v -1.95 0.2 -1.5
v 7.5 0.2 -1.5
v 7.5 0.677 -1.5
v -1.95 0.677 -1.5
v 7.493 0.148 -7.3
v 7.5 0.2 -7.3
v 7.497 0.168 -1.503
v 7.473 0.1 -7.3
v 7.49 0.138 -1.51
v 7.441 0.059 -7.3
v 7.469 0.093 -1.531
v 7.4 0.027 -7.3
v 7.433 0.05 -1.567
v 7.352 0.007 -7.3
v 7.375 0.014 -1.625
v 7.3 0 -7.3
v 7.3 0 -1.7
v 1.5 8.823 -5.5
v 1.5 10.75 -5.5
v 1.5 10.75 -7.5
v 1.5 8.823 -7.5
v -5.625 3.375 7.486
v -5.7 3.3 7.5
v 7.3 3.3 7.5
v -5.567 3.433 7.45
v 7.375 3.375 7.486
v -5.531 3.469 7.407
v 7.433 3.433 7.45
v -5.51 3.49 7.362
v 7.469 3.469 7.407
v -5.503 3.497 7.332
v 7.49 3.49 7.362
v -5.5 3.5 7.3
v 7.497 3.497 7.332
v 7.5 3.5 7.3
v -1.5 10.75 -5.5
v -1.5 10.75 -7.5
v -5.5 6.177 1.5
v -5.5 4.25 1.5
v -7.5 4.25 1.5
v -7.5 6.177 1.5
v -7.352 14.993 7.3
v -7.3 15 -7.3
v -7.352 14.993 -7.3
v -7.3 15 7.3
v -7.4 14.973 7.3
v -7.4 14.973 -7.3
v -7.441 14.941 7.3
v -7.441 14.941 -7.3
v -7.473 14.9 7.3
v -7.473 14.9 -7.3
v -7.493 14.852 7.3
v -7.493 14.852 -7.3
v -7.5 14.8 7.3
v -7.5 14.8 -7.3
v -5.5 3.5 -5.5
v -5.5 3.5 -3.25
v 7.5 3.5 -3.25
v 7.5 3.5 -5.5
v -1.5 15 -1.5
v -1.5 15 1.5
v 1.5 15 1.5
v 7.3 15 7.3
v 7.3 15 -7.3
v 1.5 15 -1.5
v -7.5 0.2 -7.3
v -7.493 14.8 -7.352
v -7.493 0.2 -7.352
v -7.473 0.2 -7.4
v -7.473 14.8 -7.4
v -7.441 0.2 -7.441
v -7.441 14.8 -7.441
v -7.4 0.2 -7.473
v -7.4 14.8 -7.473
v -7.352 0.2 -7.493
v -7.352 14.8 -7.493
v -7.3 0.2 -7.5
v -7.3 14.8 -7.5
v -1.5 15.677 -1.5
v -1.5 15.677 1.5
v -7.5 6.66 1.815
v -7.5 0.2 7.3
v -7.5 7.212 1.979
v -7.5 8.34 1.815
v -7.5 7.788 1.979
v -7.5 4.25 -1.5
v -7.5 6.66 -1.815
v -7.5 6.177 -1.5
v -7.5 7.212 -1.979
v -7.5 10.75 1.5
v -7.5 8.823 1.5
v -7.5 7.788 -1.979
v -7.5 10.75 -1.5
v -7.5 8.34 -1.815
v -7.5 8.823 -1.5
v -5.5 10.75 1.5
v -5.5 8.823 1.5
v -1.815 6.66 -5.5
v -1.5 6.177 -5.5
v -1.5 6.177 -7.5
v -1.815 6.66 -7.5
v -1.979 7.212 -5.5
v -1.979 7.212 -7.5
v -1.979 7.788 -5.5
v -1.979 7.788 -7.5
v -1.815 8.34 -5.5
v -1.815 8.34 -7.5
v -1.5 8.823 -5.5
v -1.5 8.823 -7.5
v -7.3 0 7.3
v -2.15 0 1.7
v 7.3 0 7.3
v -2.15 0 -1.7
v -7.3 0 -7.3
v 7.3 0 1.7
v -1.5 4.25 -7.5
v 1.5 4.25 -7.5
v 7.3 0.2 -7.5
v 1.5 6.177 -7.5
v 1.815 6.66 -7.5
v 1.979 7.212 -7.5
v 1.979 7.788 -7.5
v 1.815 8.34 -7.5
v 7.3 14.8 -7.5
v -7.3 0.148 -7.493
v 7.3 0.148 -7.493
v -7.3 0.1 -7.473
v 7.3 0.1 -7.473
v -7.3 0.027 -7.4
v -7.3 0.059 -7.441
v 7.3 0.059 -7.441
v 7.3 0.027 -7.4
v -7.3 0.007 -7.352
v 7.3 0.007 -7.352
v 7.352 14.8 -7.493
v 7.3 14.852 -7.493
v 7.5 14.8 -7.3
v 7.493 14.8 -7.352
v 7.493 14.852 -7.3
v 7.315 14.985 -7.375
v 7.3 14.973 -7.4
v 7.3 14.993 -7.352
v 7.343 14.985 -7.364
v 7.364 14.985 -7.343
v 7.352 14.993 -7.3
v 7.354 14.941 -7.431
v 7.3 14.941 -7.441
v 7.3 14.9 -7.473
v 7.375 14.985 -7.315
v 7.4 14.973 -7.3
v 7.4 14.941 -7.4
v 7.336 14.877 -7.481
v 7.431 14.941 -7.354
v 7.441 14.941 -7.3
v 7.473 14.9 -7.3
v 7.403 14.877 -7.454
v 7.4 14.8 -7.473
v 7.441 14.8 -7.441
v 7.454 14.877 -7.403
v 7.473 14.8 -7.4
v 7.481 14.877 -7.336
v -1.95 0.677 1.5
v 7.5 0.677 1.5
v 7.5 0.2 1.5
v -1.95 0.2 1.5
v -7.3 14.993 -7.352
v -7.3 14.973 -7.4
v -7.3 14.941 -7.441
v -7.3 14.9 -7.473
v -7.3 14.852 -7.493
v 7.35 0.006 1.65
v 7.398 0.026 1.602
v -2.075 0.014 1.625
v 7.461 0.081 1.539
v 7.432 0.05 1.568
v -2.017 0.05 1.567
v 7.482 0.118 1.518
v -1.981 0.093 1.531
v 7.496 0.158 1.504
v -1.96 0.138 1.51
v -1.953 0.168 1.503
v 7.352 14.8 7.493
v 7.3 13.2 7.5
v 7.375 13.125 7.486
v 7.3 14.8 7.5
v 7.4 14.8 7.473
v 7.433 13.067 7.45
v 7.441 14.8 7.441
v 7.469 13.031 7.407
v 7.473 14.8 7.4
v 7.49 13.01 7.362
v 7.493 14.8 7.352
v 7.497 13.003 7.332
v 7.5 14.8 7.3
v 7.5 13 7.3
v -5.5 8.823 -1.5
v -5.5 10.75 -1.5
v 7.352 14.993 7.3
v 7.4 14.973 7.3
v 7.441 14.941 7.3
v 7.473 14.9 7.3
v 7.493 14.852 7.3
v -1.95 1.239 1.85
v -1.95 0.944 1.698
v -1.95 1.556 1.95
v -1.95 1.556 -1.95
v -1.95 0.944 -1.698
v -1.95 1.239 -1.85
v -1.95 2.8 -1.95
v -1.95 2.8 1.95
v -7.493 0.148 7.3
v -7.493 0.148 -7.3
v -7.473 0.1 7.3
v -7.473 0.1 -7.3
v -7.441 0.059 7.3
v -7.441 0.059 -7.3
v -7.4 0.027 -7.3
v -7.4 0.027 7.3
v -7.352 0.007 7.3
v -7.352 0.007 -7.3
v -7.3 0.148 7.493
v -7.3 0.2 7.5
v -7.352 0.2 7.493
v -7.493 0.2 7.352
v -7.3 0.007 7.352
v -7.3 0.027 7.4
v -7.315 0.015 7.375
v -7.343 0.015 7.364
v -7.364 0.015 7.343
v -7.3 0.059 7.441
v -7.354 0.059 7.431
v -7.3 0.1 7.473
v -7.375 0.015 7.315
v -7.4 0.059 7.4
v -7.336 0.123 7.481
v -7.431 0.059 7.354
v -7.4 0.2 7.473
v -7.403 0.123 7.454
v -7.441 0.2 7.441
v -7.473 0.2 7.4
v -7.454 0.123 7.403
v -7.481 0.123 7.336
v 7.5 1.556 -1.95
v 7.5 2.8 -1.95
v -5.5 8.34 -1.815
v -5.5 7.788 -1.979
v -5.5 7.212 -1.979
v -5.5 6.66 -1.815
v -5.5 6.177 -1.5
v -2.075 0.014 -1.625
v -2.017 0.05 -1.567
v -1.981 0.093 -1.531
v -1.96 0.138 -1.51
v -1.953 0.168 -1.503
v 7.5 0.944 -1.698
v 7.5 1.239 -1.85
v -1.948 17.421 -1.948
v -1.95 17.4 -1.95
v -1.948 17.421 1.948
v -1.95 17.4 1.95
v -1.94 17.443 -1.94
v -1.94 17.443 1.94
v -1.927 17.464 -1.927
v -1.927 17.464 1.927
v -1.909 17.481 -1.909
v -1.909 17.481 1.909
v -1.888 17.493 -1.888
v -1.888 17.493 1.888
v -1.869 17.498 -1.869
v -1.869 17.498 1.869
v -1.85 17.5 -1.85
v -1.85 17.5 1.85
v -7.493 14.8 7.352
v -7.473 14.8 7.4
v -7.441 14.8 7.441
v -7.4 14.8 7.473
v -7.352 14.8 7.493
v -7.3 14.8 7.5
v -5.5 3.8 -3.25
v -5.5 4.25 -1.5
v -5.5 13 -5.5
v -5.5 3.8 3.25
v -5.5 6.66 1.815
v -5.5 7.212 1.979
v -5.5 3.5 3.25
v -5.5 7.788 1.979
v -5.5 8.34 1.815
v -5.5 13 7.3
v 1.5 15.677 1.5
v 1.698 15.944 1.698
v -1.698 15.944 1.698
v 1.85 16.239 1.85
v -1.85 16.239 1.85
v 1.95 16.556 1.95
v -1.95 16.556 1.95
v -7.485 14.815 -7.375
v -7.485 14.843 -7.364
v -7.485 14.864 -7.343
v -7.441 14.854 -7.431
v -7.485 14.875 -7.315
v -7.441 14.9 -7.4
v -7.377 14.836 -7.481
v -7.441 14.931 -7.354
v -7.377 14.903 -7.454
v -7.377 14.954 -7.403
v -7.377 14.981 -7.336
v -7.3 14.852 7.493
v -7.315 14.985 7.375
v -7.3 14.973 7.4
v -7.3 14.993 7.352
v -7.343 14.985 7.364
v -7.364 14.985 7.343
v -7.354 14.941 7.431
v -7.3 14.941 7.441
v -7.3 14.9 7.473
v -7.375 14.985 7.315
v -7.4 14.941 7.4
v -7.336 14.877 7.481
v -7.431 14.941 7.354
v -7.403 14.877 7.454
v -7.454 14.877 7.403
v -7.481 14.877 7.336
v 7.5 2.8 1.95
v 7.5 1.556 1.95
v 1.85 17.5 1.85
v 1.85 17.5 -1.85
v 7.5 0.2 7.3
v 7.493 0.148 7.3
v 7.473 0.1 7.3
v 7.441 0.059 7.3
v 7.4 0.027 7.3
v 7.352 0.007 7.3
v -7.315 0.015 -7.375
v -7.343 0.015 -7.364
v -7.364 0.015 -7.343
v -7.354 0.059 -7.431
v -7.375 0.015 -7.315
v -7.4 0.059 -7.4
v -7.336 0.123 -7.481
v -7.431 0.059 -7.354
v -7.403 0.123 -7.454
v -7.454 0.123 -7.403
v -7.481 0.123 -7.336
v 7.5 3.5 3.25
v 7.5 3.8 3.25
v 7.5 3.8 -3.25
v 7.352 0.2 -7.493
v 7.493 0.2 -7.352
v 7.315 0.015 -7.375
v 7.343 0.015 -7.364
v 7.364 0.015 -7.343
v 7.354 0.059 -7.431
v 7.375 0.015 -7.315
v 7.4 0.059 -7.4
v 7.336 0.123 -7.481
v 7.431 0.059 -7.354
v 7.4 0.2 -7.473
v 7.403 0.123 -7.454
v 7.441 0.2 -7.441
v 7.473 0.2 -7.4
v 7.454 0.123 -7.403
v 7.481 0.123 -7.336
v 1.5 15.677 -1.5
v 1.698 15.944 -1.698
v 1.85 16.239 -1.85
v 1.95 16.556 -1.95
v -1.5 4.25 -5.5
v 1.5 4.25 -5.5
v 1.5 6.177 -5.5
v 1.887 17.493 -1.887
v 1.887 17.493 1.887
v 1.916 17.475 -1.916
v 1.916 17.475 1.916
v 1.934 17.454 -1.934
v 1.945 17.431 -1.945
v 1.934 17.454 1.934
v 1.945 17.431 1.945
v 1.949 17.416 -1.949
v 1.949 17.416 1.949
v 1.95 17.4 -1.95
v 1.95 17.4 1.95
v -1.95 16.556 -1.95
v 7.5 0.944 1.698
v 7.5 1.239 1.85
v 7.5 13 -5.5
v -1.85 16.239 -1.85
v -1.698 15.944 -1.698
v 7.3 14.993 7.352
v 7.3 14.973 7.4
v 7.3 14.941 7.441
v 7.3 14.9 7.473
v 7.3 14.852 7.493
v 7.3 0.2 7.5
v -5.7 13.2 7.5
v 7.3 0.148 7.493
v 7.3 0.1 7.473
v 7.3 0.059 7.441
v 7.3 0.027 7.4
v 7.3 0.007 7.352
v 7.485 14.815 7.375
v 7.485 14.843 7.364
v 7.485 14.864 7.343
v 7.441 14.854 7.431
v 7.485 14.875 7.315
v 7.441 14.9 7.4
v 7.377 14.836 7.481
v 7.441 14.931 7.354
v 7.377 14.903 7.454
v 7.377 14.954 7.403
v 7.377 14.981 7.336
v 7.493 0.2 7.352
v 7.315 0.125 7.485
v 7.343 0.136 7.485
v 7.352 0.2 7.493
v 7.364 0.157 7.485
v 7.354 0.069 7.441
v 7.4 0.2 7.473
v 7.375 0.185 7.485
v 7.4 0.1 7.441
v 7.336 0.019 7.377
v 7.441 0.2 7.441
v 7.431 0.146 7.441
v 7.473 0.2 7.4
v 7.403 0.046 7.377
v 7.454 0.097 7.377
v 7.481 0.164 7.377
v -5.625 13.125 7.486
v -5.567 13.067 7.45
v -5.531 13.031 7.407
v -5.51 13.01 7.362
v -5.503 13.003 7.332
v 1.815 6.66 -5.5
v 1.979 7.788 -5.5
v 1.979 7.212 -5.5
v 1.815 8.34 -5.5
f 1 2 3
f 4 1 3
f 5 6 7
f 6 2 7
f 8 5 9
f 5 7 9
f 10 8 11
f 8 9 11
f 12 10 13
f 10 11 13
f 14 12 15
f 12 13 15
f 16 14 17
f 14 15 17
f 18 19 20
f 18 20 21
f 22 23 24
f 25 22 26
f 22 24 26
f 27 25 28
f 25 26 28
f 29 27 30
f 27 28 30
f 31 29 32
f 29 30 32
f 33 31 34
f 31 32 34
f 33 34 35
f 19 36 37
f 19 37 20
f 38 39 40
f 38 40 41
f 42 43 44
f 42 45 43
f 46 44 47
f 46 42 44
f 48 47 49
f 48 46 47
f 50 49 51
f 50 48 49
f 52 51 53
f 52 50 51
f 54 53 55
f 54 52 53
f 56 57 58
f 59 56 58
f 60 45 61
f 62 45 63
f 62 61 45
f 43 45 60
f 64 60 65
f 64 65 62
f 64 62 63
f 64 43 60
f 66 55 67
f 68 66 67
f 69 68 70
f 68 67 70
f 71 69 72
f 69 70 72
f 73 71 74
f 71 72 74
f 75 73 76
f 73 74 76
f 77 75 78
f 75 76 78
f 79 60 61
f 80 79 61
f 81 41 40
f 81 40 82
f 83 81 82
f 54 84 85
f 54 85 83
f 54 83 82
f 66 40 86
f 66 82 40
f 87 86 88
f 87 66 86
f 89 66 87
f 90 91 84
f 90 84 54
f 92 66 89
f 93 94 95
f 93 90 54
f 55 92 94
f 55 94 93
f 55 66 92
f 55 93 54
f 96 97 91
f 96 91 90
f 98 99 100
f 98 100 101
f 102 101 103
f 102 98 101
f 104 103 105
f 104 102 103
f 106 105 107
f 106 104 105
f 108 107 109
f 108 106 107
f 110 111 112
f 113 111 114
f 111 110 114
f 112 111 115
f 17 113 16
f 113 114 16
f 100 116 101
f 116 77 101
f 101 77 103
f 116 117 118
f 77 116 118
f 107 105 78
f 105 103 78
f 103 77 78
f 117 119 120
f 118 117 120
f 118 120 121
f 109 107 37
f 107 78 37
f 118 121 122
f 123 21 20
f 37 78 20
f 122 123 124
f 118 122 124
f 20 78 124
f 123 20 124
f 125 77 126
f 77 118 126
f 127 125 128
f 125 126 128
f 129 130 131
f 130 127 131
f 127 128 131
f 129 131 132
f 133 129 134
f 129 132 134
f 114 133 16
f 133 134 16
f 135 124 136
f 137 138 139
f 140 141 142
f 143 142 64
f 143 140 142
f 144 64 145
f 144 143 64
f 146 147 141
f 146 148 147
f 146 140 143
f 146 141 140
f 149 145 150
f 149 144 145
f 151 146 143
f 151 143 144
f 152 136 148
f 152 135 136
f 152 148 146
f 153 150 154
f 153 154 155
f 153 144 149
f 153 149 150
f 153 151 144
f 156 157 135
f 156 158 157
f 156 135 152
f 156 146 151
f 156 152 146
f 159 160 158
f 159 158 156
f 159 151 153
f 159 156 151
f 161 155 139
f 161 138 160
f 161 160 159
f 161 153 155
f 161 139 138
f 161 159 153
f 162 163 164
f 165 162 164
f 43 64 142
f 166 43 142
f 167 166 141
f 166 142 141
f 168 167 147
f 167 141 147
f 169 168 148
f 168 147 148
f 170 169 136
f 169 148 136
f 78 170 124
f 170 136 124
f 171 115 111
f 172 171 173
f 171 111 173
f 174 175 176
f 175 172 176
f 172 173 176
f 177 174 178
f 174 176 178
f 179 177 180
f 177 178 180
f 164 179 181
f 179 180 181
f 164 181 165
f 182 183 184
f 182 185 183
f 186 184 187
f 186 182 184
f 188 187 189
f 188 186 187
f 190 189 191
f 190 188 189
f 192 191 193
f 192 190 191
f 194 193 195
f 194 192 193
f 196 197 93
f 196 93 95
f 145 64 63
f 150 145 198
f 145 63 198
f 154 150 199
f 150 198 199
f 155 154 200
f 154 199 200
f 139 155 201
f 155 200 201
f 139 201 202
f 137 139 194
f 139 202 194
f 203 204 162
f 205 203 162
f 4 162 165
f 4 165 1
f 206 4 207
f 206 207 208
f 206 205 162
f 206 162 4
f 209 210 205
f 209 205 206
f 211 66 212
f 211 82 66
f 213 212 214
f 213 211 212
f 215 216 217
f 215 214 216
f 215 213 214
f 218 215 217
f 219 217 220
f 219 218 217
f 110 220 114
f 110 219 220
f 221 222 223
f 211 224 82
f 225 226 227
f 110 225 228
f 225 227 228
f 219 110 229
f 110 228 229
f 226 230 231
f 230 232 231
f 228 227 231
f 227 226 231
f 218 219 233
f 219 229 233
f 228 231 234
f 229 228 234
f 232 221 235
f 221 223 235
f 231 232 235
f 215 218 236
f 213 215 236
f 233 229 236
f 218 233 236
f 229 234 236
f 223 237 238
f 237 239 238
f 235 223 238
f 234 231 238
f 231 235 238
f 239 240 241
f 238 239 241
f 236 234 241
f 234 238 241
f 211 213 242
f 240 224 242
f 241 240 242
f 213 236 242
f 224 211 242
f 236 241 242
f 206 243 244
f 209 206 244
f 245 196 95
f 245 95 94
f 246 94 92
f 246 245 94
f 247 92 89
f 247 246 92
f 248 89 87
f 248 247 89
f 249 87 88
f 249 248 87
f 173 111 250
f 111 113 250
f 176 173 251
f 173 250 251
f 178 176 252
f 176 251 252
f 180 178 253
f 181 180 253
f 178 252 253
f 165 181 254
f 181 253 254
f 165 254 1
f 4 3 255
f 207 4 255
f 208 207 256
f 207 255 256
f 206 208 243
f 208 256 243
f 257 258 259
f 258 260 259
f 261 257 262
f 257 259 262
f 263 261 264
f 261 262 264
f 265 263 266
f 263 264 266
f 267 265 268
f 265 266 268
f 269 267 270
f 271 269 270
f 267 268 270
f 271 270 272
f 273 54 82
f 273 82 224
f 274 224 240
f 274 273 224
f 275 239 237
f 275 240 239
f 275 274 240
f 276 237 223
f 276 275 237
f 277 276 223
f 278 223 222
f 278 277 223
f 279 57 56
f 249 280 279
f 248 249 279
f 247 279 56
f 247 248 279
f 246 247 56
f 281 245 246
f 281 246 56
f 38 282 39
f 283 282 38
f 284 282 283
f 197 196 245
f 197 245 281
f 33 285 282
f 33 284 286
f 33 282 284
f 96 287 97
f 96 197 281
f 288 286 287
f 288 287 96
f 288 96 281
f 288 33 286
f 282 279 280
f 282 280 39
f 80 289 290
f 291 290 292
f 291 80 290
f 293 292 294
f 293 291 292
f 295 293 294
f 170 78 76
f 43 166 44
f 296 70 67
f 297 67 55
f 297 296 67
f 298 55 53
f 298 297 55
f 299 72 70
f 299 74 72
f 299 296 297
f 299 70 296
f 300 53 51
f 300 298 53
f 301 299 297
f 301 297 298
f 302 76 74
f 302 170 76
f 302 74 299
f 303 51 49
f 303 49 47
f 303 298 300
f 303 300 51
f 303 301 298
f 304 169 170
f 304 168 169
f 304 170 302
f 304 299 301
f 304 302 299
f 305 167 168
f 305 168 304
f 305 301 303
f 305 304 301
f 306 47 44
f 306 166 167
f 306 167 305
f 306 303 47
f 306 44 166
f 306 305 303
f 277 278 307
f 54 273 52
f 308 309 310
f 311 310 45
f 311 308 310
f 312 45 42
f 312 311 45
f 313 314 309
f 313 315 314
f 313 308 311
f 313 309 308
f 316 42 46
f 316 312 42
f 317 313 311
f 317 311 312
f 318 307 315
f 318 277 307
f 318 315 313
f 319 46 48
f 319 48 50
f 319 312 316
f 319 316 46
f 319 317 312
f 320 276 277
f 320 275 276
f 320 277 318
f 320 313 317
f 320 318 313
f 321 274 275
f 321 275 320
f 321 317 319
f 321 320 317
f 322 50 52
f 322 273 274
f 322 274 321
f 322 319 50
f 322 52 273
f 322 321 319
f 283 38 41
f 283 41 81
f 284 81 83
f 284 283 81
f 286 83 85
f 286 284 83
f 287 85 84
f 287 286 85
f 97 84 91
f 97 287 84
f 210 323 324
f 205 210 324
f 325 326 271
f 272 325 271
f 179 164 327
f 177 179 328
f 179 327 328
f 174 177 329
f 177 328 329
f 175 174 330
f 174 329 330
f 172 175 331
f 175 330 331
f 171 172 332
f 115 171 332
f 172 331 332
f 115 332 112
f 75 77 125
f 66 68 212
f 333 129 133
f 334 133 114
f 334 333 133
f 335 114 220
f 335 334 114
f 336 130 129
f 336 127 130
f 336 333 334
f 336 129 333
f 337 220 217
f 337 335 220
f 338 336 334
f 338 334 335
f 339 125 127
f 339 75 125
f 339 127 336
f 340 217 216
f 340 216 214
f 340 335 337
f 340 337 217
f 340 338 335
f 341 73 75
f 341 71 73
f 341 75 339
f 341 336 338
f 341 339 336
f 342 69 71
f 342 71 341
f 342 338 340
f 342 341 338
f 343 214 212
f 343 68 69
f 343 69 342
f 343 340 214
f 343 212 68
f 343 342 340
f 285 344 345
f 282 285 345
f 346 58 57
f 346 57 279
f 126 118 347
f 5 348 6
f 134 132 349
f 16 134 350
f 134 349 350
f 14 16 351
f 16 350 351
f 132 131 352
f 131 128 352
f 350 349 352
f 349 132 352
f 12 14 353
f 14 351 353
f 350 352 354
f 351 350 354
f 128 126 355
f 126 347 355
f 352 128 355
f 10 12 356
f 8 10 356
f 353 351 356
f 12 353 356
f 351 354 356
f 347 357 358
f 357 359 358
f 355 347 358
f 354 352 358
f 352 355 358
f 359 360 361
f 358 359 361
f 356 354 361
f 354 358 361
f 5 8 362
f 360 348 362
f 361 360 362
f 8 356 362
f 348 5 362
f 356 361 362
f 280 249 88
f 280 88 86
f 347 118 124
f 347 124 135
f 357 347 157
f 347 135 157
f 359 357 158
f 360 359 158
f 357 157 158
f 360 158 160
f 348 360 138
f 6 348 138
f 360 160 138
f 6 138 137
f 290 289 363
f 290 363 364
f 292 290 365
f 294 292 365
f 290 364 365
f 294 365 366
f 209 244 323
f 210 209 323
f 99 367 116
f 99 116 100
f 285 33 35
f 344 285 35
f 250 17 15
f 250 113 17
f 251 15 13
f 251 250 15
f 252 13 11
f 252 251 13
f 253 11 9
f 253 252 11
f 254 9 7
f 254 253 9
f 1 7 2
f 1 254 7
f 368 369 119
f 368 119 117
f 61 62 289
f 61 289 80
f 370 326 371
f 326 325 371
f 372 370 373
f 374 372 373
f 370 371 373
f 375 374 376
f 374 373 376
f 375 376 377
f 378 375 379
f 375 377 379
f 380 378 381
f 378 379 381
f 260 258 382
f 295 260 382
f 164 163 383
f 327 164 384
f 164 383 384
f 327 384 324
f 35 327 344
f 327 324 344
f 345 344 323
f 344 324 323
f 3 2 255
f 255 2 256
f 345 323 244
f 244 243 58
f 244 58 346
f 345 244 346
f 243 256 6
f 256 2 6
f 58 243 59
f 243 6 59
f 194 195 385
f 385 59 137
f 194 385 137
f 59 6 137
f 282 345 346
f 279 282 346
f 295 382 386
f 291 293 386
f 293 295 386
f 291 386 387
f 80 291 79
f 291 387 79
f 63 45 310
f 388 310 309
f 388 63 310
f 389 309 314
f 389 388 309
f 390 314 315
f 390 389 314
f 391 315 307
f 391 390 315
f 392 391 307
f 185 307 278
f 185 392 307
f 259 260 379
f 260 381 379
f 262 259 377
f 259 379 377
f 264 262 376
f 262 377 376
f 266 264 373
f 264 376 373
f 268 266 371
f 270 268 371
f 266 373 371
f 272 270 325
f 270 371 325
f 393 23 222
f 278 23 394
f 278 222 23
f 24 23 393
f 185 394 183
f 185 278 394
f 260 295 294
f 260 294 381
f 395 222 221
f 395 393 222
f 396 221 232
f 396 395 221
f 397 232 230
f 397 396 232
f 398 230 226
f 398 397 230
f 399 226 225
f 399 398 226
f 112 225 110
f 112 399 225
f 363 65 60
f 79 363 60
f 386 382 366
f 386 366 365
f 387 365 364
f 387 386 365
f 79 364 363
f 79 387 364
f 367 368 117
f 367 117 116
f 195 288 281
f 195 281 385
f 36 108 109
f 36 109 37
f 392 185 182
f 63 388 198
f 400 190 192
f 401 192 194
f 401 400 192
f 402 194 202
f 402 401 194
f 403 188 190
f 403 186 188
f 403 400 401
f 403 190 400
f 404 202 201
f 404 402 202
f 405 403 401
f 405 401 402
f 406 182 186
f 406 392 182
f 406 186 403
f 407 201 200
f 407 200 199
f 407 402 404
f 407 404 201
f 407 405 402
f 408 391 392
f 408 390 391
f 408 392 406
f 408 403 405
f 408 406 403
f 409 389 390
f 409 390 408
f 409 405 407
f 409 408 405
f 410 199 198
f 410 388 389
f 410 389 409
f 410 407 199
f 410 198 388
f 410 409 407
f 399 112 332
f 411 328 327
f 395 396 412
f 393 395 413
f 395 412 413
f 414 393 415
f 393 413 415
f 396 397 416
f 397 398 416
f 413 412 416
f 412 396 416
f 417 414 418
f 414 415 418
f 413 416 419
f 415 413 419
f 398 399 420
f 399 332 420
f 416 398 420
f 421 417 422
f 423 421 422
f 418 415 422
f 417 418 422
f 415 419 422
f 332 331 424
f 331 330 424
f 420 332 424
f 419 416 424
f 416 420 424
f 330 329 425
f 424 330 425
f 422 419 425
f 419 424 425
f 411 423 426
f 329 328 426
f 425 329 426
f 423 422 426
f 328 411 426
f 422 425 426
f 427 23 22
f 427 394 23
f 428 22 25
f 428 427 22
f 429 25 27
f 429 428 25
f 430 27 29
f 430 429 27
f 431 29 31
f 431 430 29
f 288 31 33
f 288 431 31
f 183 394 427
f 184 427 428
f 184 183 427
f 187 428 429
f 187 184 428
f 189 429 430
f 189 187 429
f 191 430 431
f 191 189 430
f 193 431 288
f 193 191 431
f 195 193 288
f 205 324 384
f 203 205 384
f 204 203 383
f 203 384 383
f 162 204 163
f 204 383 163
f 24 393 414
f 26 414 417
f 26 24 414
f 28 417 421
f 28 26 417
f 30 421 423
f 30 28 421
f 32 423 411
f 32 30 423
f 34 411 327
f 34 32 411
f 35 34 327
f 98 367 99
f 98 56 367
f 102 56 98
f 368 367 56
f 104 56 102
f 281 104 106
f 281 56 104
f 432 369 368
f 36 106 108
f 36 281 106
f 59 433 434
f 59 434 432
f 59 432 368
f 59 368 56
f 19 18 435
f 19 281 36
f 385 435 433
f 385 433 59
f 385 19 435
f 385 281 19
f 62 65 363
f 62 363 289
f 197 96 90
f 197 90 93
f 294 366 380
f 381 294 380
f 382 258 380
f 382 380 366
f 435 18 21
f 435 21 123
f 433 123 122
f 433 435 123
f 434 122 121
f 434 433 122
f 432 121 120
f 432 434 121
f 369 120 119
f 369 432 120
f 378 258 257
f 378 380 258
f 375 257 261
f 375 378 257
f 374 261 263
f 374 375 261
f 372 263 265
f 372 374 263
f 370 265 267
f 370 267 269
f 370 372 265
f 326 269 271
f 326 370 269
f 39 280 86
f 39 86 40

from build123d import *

# Parameters (mm, degrees)
EXTRUDE_1_DEPTH      = 7.5
EXTRUDE_1_DEPTH_BACK = 7.5
SKETCH_1_W           = 15
SKETCH_1_H           = 15
SKETCH_2_W           = 13
SKETCH_2_H           = 9.5
CUT_EXTRUDE_1_DEPTH  = 13
SKETCH_3_W           = 3
SKETCH_3_H           = 3
EXTRUDE_2_DEPTH      = 1
EXTRUDE_3_DEPTH      = 2
EXTRUDE_3_DEPTH_BACK = 2
CUT_EXTRUDE_2_REACH  = 23.256
EXTRUDE_4_REACH      = 26.238
SKETCH_6_W           = 6.5
SKETCH_6_H           = 0.3
CUT_EXTRUDE_3_DEPTH  = 9.45
CUT_EXTRUDE_4_REACH  = 25.054
CUT_EXTRUDE_5_REACH  = 25.054
FILLET_1_R           = 0.1
FILLET_2_R           = 0.2


with BuildPart() as part:
    # Sketch 1 → Extrude 1 (new, two sides: drawn at the far end of the back side and taken through both)
    with BuildSketch(Plane.XY.offset(-EXTRUDE_1_DEPTH_BACK)):
        with Locations((0, 7.5)):
            Rectangle(SKETCH_1_W, SKETCH_1_H)
    extrude(amount=EXTRUDE_1_DEPTH + EXTRUDE_1_DEPTH_BACK)

    # Sketch 2 → Cut-Extrude 1 (cut)
    with BuildSketch(Plane.XY.offset(7.5)):
        with Locations((1, 8.25)):
            Rectangle(SKETCH_2_W, SKETCH_2_H)
    extrude(amount=-CUT_EXTRUDE_1_DEPTH, mode=Mode.SUBTRACT)

    # Sketch 3 → Extrude 2 (add)
    with BuildSketch(Plane(origin=(0, 15, 0), x_dir=(-1, 0, 0), z_dir=(0, 1, 0))):
        Rectangle(SKETCH_3_W, SKETCH_3_H)
    extrude(amount=EXTRUDE_2_DEPTH)

    # Sketch 4 → Extrude 3 (add, two sides: drawn at the far end of the back side and taken through both)
    with BuildSketch(Plane.XY.offset(-EXTRUDE_3_DEPTH_BACK)):
        with BuildLine():
            Line((-1.95, 17.5), (-1.95, 16.555590279))
            ThreePointArc((-1.95, 16.555590279), (-1.780042303, 16.088161527), (-1.5, 15.677124344))
            Line((-1.5, 15.677124344), (1.5, 15.677124344))
            ThreePointArc((1.5, 15.677124344), (1.780042303, 16.088161527), (1.95, 16.555590279))
            Line((1.95, 16.555590279), (1.95, 17.5))
            Line((1.95, 17.5), (-1.95, 17.5))
        make_face()
    extrude(amount=EXTRUDE_3_DEPTH + EXTRUDE_3_DEPTH_BACK)

    # Sketch 5 → Cut-Extrude 2 (cut, up to next)
    with BuildSketch(Plane.ZY.offset(1.95), mode=Mode.PRIVATE) as cut_extrude_2_sk1:
        with BuildLine():
            Line((-1.95, 17.5), (-1.95, 16.555590279))
            ThreePointArc((-1.95, 16.555590279), (-1.780042303, 16.088161527), (-1.5, 15.677124344))
            Line((-1.5, 15.677124344), (-2, 15.677124344))
            Line((-2, 15.677124344), (-2, 17.5))
            Line((-2, 17.5), (-1.95, 17.5))
        make_face()
    cut_extrude_2_tool1 = extrude(cut_extrude_2_sk1.sketch, amount=-CUT_EXTRUDE_2_REACH, mode=Mode.PRIVATE) & part.part
    # Sketch 5 → Cut-Extrude 2 (cut, up to next)
    with BuildSketch(Plane.ZY.offset(1.95), mode=Mode.PRIVATE) as cut_extrude_2_sk2:
        with BuildLine():
            Line((2, 17.5), (2, 15.677124344))
            Line((2, 15.677124344), (1.5, 15.677124344))
            ThreePointArc((1.5, 15.677124344), (1.780042303, 16.088161527), (1.95, 16.555590279))
            Line((1.95, 16.555590279), (1.95, 17.5))
            Line((1.95, 17.5), (2, 17.5))
        make_face()
    cut_extrude_2_tool2 = extrude(cut_extrude_2_sk2.sketch, amount=-CUT_EXTRUDE_2_REACH, mode=Mode.PRIVATE) & part.part
    add(cut_extrude_2_tool1.solids().sort_by_distance((-1.95, 16.175075, -1.873038))[0], mode=Mode.SUBTRACT)
    add(cut_extrude_2_tool2.solids().sort_by_distance((-1.95, 16.175075, 1.873038))[0], mode=Mode.SUBTRACT)

    # Sketch 6 → Extrude 4 (add, up to next)
    with BuildSketch(Plane(origin=(7.5, 0, 0), x_dir=(0, 0, -1), z_dir=(1, 0, 0)), mode=Mode.PRIVATE) as extrude_4_sk1:
        with Locations((0, 3.65)):
            Rectangle(SKETCH_6_W, SKETCH_6_H)
    extrude_4_tool1 = extrude(extrude_4_sk1.sketch, amount=-EXTRUDE_4_REACH, mode=Mode.PRIVATE) - part.part
    add(extrude_4_tool1.solids().sort_by_distance((7.5, 3.65, 0))[0])

    # Sketch 7 → Cut-Extrude 3 (cut)
    with BuildSketch(Plane(origin=(7.5, 0, 0), x_dir=(0, 0, -1), z_dir=(1, 0, 0))):
        with BuildLine():
            Line((-1.5, 0), (1.5, 0))
            Line((1.5, 0), (1.5, 0.677124344))
            ThreePointArc((1.5, 0.677124344), (1.780042303, 1.088161527), (1.95, 1.555590279))
            Line((1.95, 1.555590279), (1.95, 2.8))
            Line((1.95, 2.8), (-1.95, 2.8))
            Line((-1.95, 2.8), (-1.95, 1.555590279))
            ThreePointArc((-1.95, 1.555590279), (-1.780042303, 1.088161527), (-1.5, 0.677124344))
            Line((-1.5, 0.677124344), (-1.5, 0))
        make_face()
    extrude(amount=-CUT_EXTRUDE_3_DEPTH, mode=Mode.SUBTRACT)

    # Sketch 8 → Cut-Extrude 4 (cut, up to next)
    with BuildSketch(Plane.XY.offset(-5.5), mode=Mode.PRIVATE) as cut_extrude_4_sk1:
        with BuildLine():
            Line((-1.5, 8.822875656), (-1.5, 10.75))
            Line((-1.5, 10.75), (1.5, 10.75))
            Line((1.5, 10.75), (1.5, 8.822875656))
            ThreePointArc((1.5, 8.822875656), (2, 7.5), (1.5, 6.177124344))
            Line((1.5, 6.177124344), (1.5, 4.25))
            Line((1.5, 4.25), (-1.5, 4.25))
            Line((-1.5, 4.25), (-1.5, 6.177124344))
            ThreePointArc((-1.5, 6.177124344), (-2, 7.5), (-1.5, 8.822875656))
        make_face()
    cut_extrude_4_tool1 = extrude(cut_extrude_4_sk1.sketch, amount=-CUT_EXTRUDE_4_REACH, mode=Mode.PRIVATE) & part.part
    add(cut_extrude_4_tool1.solids().sort_by_distance((0, 7.5, -5.5))[0], mode=Mode.SUBTRACT)

    # Sketch 9 → Cut-Extrude 5 (cut, up to next)
    with BuildSketch(Plane(origin=(-5.5, 0, 0), x_dir=(0, 0, -1), z_dir=(1, 0, 0)), mode=Mode.PRIVATE) as cut_extrude_5_sk1:
        with BuildLine():
            Line((-1.5, 8.822875656), (-1.5, 10.75))
            Line((-1.5, 10.75), (1.5, 10.75))
            Line((1.5, 10.75), (1.5, 8.822875656))
            ThreePointArc((1.5, 8.822875656), (2, 7.5), (1.5, 6.177124344))
            Line((1.5, 6.177124344), (1.5, 4.25))
            Line((1.5, 4.25), (-1.5, 4.25))
            Line((-1.5, 4.25), (-1.5, 6.177124344))
            ThreePointArc((-1.5, 6.177124344), (-2, 7.5), (-1.5, 8.822875656))
        make_face()
    cut_extrude_5_tool1 = extrude(cut_extrude_5_sk1.sketch, amount=-CUT_EXTRUDE_5_REACH, mode=Mode.PRIVATE) & part.part
    add(cut_extrude_5_tool1.solids().sort_by_distance((-5.5, 7.5, 0))[0], mode=Mode.SUBTRACT)

    # Fillet 1
    fillet_1_edges = [part.edges().sort_by_distance(p)[0] for p in [
        (-1.95, 17.5, 0),
        (1.95, 17.5, 0),
        (0, 17.5, -1.95),
        (0, 17.5, 1.95),
    ]]
    fillet(fillet_1_edges, radius=FILLET_1_R)

    # Fillet 2
    fillet_2_edges = [part.edges().sort_by_distance(p)[0] for p in [
        (7.5, 7.5, -7.5),
        (7.5, 0, 4.5),
        (-7.5, 7.5, 7.5),
        (-1.95, 0, 0),
        (2.775, 0, -1.5),
        (2.775, 0, 1.5),
        (0, 0, 7.5),
        (0, 15, -7.5),
        (7.5, 1.75, 7.5),
        (0, 15, 7.5),
        (7.5, 14, 7.5),
        (-5.5, 8.25, 7.5),
        (1, 3.5, 7.5),
        (1, 13, 7.5),
        (-7.5, 7.5, -7.5),
        (0, 0, -7.5),
        (-7.5, 15, 0),
        (7.5, 15, 0),
        (7.5, 0, -4.5),
        (-7.5, 0, 0),
    ]]
    fillet(fillet_2_edges, radius=FILLET_2_R)


solid = part.part
